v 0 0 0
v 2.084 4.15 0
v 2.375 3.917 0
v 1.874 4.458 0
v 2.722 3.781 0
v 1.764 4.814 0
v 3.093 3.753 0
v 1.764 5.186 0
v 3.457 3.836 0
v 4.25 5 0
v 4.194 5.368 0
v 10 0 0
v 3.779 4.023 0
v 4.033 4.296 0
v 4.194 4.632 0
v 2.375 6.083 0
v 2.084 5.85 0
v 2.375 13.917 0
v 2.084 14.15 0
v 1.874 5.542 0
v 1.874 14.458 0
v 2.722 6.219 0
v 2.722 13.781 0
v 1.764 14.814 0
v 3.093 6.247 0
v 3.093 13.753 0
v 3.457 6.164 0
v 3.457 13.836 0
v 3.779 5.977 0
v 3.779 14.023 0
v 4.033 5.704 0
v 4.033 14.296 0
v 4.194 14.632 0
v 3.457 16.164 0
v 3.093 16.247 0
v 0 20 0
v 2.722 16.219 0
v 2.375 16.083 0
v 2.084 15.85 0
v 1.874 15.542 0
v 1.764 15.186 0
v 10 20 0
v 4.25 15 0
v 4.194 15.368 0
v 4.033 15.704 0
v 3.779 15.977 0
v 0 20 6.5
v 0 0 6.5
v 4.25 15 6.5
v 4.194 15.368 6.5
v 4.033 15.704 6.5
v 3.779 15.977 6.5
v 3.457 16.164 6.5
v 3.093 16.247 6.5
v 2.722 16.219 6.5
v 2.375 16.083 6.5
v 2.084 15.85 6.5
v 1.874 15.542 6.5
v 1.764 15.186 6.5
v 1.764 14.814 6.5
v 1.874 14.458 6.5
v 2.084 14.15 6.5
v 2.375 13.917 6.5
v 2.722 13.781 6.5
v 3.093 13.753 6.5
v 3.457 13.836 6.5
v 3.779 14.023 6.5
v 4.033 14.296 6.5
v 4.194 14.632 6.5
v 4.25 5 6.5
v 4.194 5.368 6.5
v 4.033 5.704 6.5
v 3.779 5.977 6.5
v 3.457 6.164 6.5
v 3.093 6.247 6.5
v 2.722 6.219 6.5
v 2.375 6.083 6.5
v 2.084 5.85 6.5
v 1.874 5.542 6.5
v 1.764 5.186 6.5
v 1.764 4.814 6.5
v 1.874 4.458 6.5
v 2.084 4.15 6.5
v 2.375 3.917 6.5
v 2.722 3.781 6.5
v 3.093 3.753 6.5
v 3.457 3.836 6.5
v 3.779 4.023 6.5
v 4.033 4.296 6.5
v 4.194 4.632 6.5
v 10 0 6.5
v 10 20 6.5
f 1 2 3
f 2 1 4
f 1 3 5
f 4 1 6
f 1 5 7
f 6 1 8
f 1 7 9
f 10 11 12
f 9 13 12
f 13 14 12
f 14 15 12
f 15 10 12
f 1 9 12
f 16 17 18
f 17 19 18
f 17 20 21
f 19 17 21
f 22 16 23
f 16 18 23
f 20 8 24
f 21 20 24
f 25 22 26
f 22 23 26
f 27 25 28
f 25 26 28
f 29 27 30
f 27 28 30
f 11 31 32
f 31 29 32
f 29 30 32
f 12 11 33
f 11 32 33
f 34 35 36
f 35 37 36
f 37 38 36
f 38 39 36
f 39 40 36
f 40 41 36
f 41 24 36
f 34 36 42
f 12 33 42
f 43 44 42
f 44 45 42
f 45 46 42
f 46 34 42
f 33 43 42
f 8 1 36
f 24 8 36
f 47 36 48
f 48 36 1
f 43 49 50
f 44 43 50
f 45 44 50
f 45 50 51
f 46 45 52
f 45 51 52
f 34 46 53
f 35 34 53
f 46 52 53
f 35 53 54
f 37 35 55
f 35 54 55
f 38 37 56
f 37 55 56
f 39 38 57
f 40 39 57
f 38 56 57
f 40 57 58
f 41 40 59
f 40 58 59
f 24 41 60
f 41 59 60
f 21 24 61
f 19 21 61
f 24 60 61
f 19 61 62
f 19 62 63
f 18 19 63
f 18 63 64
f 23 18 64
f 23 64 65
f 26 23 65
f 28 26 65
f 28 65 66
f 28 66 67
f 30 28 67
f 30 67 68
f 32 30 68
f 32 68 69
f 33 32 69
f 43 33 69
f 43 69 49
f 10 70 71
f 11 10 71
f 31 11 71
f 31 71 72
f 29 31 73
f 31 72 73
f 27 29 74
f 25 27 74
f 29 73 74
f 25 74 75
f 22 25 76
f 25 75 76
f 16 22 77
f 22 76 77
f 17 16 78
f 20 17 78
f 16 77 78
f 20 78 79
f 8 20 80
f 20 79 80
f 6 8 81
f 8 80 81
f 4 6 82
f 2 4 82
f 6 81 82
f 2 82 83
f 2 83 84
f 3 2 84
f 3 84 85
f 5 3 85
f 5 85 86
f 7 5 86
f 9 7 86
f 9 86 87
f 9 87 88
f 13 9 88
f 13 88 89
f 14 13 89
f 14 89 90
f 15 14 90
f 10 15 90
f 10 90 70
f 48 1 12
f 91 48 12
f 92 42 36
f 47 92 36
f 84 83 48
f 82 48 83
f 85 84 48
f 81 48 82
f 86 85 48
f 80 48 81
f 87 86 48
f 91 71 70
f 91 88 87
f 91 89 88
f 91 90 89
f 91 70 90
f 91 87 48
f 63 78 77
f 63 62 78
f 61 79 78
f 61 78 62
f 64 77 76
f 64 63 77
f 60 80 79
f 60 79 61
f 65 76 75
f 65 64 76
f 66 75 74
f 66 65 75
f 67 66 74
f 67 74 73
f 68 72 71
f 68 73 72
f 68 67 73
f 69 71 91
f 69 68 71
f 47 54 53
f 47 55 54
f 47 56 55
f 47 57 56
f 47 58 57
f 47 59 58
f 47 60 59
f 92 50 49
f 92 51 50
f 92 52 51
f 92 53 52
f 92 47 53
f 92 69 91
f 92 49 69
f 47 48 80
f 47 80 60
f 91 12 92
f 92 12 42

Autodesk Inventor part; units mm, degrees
ref_plane "YZ Plane" through (0, 0, 0) normal (1, 0, 0) x (0, 1, 0)
ref_plane "XZ Plane" through (0, 0, 0) normal (0, 1, 0) x (-1, 0, 0)
ref_plane "XY Plane" through (0, 0, 0) normal (0, 0, 1) x (1, 0, 0)
sketch "Sketch1" plane through (0, 0, 0) normal (0, 0, 1) x (1, 0, 0)
  line L0 (0, 0) -> (10, 0)
  line L1 (10, 0) -> (10, 20)
  line L2 (10, 20) -> (0, 20)
  line L3 (0, 20) -> (0, 0)
  dimension "d0" = 10
  dimension "d1" = 20
extrude "Extrusion1" add sketch "Sketch1" along normal blind 6.5
sketch "Sketch2" plane through (0, 0, 6.5) normal (0, 0, 1) x (1, 0, 0)
  circle A0 centre (3, 15) radius 1.25
  circle A1 centre (3, 5) radius 1.25
  line L0 (10, 0) -> (10, 20) projected
  line L1 (10, 20) -> (0, 20) projected
  line L2 (0, 20) -> (0, 0) projected
  line L3 (0, 0) -> (10, 0) projected
  dimension "d4" = 5
  dimension "d5" = 2.5
  dimension "d6" = 3
  dimension "d7" = 5
  dimension "d8" = 3
  dimension "d9" = 2.5
extrude "Extrusion2" cut sketch "Sketch2" against normal through all contours A0 | A1
ref_plane "Work Plane1" through (0, 0, 3.25) normal (0, 0, 1) x (1, 0, 0)
properties part number "micro-switch"
